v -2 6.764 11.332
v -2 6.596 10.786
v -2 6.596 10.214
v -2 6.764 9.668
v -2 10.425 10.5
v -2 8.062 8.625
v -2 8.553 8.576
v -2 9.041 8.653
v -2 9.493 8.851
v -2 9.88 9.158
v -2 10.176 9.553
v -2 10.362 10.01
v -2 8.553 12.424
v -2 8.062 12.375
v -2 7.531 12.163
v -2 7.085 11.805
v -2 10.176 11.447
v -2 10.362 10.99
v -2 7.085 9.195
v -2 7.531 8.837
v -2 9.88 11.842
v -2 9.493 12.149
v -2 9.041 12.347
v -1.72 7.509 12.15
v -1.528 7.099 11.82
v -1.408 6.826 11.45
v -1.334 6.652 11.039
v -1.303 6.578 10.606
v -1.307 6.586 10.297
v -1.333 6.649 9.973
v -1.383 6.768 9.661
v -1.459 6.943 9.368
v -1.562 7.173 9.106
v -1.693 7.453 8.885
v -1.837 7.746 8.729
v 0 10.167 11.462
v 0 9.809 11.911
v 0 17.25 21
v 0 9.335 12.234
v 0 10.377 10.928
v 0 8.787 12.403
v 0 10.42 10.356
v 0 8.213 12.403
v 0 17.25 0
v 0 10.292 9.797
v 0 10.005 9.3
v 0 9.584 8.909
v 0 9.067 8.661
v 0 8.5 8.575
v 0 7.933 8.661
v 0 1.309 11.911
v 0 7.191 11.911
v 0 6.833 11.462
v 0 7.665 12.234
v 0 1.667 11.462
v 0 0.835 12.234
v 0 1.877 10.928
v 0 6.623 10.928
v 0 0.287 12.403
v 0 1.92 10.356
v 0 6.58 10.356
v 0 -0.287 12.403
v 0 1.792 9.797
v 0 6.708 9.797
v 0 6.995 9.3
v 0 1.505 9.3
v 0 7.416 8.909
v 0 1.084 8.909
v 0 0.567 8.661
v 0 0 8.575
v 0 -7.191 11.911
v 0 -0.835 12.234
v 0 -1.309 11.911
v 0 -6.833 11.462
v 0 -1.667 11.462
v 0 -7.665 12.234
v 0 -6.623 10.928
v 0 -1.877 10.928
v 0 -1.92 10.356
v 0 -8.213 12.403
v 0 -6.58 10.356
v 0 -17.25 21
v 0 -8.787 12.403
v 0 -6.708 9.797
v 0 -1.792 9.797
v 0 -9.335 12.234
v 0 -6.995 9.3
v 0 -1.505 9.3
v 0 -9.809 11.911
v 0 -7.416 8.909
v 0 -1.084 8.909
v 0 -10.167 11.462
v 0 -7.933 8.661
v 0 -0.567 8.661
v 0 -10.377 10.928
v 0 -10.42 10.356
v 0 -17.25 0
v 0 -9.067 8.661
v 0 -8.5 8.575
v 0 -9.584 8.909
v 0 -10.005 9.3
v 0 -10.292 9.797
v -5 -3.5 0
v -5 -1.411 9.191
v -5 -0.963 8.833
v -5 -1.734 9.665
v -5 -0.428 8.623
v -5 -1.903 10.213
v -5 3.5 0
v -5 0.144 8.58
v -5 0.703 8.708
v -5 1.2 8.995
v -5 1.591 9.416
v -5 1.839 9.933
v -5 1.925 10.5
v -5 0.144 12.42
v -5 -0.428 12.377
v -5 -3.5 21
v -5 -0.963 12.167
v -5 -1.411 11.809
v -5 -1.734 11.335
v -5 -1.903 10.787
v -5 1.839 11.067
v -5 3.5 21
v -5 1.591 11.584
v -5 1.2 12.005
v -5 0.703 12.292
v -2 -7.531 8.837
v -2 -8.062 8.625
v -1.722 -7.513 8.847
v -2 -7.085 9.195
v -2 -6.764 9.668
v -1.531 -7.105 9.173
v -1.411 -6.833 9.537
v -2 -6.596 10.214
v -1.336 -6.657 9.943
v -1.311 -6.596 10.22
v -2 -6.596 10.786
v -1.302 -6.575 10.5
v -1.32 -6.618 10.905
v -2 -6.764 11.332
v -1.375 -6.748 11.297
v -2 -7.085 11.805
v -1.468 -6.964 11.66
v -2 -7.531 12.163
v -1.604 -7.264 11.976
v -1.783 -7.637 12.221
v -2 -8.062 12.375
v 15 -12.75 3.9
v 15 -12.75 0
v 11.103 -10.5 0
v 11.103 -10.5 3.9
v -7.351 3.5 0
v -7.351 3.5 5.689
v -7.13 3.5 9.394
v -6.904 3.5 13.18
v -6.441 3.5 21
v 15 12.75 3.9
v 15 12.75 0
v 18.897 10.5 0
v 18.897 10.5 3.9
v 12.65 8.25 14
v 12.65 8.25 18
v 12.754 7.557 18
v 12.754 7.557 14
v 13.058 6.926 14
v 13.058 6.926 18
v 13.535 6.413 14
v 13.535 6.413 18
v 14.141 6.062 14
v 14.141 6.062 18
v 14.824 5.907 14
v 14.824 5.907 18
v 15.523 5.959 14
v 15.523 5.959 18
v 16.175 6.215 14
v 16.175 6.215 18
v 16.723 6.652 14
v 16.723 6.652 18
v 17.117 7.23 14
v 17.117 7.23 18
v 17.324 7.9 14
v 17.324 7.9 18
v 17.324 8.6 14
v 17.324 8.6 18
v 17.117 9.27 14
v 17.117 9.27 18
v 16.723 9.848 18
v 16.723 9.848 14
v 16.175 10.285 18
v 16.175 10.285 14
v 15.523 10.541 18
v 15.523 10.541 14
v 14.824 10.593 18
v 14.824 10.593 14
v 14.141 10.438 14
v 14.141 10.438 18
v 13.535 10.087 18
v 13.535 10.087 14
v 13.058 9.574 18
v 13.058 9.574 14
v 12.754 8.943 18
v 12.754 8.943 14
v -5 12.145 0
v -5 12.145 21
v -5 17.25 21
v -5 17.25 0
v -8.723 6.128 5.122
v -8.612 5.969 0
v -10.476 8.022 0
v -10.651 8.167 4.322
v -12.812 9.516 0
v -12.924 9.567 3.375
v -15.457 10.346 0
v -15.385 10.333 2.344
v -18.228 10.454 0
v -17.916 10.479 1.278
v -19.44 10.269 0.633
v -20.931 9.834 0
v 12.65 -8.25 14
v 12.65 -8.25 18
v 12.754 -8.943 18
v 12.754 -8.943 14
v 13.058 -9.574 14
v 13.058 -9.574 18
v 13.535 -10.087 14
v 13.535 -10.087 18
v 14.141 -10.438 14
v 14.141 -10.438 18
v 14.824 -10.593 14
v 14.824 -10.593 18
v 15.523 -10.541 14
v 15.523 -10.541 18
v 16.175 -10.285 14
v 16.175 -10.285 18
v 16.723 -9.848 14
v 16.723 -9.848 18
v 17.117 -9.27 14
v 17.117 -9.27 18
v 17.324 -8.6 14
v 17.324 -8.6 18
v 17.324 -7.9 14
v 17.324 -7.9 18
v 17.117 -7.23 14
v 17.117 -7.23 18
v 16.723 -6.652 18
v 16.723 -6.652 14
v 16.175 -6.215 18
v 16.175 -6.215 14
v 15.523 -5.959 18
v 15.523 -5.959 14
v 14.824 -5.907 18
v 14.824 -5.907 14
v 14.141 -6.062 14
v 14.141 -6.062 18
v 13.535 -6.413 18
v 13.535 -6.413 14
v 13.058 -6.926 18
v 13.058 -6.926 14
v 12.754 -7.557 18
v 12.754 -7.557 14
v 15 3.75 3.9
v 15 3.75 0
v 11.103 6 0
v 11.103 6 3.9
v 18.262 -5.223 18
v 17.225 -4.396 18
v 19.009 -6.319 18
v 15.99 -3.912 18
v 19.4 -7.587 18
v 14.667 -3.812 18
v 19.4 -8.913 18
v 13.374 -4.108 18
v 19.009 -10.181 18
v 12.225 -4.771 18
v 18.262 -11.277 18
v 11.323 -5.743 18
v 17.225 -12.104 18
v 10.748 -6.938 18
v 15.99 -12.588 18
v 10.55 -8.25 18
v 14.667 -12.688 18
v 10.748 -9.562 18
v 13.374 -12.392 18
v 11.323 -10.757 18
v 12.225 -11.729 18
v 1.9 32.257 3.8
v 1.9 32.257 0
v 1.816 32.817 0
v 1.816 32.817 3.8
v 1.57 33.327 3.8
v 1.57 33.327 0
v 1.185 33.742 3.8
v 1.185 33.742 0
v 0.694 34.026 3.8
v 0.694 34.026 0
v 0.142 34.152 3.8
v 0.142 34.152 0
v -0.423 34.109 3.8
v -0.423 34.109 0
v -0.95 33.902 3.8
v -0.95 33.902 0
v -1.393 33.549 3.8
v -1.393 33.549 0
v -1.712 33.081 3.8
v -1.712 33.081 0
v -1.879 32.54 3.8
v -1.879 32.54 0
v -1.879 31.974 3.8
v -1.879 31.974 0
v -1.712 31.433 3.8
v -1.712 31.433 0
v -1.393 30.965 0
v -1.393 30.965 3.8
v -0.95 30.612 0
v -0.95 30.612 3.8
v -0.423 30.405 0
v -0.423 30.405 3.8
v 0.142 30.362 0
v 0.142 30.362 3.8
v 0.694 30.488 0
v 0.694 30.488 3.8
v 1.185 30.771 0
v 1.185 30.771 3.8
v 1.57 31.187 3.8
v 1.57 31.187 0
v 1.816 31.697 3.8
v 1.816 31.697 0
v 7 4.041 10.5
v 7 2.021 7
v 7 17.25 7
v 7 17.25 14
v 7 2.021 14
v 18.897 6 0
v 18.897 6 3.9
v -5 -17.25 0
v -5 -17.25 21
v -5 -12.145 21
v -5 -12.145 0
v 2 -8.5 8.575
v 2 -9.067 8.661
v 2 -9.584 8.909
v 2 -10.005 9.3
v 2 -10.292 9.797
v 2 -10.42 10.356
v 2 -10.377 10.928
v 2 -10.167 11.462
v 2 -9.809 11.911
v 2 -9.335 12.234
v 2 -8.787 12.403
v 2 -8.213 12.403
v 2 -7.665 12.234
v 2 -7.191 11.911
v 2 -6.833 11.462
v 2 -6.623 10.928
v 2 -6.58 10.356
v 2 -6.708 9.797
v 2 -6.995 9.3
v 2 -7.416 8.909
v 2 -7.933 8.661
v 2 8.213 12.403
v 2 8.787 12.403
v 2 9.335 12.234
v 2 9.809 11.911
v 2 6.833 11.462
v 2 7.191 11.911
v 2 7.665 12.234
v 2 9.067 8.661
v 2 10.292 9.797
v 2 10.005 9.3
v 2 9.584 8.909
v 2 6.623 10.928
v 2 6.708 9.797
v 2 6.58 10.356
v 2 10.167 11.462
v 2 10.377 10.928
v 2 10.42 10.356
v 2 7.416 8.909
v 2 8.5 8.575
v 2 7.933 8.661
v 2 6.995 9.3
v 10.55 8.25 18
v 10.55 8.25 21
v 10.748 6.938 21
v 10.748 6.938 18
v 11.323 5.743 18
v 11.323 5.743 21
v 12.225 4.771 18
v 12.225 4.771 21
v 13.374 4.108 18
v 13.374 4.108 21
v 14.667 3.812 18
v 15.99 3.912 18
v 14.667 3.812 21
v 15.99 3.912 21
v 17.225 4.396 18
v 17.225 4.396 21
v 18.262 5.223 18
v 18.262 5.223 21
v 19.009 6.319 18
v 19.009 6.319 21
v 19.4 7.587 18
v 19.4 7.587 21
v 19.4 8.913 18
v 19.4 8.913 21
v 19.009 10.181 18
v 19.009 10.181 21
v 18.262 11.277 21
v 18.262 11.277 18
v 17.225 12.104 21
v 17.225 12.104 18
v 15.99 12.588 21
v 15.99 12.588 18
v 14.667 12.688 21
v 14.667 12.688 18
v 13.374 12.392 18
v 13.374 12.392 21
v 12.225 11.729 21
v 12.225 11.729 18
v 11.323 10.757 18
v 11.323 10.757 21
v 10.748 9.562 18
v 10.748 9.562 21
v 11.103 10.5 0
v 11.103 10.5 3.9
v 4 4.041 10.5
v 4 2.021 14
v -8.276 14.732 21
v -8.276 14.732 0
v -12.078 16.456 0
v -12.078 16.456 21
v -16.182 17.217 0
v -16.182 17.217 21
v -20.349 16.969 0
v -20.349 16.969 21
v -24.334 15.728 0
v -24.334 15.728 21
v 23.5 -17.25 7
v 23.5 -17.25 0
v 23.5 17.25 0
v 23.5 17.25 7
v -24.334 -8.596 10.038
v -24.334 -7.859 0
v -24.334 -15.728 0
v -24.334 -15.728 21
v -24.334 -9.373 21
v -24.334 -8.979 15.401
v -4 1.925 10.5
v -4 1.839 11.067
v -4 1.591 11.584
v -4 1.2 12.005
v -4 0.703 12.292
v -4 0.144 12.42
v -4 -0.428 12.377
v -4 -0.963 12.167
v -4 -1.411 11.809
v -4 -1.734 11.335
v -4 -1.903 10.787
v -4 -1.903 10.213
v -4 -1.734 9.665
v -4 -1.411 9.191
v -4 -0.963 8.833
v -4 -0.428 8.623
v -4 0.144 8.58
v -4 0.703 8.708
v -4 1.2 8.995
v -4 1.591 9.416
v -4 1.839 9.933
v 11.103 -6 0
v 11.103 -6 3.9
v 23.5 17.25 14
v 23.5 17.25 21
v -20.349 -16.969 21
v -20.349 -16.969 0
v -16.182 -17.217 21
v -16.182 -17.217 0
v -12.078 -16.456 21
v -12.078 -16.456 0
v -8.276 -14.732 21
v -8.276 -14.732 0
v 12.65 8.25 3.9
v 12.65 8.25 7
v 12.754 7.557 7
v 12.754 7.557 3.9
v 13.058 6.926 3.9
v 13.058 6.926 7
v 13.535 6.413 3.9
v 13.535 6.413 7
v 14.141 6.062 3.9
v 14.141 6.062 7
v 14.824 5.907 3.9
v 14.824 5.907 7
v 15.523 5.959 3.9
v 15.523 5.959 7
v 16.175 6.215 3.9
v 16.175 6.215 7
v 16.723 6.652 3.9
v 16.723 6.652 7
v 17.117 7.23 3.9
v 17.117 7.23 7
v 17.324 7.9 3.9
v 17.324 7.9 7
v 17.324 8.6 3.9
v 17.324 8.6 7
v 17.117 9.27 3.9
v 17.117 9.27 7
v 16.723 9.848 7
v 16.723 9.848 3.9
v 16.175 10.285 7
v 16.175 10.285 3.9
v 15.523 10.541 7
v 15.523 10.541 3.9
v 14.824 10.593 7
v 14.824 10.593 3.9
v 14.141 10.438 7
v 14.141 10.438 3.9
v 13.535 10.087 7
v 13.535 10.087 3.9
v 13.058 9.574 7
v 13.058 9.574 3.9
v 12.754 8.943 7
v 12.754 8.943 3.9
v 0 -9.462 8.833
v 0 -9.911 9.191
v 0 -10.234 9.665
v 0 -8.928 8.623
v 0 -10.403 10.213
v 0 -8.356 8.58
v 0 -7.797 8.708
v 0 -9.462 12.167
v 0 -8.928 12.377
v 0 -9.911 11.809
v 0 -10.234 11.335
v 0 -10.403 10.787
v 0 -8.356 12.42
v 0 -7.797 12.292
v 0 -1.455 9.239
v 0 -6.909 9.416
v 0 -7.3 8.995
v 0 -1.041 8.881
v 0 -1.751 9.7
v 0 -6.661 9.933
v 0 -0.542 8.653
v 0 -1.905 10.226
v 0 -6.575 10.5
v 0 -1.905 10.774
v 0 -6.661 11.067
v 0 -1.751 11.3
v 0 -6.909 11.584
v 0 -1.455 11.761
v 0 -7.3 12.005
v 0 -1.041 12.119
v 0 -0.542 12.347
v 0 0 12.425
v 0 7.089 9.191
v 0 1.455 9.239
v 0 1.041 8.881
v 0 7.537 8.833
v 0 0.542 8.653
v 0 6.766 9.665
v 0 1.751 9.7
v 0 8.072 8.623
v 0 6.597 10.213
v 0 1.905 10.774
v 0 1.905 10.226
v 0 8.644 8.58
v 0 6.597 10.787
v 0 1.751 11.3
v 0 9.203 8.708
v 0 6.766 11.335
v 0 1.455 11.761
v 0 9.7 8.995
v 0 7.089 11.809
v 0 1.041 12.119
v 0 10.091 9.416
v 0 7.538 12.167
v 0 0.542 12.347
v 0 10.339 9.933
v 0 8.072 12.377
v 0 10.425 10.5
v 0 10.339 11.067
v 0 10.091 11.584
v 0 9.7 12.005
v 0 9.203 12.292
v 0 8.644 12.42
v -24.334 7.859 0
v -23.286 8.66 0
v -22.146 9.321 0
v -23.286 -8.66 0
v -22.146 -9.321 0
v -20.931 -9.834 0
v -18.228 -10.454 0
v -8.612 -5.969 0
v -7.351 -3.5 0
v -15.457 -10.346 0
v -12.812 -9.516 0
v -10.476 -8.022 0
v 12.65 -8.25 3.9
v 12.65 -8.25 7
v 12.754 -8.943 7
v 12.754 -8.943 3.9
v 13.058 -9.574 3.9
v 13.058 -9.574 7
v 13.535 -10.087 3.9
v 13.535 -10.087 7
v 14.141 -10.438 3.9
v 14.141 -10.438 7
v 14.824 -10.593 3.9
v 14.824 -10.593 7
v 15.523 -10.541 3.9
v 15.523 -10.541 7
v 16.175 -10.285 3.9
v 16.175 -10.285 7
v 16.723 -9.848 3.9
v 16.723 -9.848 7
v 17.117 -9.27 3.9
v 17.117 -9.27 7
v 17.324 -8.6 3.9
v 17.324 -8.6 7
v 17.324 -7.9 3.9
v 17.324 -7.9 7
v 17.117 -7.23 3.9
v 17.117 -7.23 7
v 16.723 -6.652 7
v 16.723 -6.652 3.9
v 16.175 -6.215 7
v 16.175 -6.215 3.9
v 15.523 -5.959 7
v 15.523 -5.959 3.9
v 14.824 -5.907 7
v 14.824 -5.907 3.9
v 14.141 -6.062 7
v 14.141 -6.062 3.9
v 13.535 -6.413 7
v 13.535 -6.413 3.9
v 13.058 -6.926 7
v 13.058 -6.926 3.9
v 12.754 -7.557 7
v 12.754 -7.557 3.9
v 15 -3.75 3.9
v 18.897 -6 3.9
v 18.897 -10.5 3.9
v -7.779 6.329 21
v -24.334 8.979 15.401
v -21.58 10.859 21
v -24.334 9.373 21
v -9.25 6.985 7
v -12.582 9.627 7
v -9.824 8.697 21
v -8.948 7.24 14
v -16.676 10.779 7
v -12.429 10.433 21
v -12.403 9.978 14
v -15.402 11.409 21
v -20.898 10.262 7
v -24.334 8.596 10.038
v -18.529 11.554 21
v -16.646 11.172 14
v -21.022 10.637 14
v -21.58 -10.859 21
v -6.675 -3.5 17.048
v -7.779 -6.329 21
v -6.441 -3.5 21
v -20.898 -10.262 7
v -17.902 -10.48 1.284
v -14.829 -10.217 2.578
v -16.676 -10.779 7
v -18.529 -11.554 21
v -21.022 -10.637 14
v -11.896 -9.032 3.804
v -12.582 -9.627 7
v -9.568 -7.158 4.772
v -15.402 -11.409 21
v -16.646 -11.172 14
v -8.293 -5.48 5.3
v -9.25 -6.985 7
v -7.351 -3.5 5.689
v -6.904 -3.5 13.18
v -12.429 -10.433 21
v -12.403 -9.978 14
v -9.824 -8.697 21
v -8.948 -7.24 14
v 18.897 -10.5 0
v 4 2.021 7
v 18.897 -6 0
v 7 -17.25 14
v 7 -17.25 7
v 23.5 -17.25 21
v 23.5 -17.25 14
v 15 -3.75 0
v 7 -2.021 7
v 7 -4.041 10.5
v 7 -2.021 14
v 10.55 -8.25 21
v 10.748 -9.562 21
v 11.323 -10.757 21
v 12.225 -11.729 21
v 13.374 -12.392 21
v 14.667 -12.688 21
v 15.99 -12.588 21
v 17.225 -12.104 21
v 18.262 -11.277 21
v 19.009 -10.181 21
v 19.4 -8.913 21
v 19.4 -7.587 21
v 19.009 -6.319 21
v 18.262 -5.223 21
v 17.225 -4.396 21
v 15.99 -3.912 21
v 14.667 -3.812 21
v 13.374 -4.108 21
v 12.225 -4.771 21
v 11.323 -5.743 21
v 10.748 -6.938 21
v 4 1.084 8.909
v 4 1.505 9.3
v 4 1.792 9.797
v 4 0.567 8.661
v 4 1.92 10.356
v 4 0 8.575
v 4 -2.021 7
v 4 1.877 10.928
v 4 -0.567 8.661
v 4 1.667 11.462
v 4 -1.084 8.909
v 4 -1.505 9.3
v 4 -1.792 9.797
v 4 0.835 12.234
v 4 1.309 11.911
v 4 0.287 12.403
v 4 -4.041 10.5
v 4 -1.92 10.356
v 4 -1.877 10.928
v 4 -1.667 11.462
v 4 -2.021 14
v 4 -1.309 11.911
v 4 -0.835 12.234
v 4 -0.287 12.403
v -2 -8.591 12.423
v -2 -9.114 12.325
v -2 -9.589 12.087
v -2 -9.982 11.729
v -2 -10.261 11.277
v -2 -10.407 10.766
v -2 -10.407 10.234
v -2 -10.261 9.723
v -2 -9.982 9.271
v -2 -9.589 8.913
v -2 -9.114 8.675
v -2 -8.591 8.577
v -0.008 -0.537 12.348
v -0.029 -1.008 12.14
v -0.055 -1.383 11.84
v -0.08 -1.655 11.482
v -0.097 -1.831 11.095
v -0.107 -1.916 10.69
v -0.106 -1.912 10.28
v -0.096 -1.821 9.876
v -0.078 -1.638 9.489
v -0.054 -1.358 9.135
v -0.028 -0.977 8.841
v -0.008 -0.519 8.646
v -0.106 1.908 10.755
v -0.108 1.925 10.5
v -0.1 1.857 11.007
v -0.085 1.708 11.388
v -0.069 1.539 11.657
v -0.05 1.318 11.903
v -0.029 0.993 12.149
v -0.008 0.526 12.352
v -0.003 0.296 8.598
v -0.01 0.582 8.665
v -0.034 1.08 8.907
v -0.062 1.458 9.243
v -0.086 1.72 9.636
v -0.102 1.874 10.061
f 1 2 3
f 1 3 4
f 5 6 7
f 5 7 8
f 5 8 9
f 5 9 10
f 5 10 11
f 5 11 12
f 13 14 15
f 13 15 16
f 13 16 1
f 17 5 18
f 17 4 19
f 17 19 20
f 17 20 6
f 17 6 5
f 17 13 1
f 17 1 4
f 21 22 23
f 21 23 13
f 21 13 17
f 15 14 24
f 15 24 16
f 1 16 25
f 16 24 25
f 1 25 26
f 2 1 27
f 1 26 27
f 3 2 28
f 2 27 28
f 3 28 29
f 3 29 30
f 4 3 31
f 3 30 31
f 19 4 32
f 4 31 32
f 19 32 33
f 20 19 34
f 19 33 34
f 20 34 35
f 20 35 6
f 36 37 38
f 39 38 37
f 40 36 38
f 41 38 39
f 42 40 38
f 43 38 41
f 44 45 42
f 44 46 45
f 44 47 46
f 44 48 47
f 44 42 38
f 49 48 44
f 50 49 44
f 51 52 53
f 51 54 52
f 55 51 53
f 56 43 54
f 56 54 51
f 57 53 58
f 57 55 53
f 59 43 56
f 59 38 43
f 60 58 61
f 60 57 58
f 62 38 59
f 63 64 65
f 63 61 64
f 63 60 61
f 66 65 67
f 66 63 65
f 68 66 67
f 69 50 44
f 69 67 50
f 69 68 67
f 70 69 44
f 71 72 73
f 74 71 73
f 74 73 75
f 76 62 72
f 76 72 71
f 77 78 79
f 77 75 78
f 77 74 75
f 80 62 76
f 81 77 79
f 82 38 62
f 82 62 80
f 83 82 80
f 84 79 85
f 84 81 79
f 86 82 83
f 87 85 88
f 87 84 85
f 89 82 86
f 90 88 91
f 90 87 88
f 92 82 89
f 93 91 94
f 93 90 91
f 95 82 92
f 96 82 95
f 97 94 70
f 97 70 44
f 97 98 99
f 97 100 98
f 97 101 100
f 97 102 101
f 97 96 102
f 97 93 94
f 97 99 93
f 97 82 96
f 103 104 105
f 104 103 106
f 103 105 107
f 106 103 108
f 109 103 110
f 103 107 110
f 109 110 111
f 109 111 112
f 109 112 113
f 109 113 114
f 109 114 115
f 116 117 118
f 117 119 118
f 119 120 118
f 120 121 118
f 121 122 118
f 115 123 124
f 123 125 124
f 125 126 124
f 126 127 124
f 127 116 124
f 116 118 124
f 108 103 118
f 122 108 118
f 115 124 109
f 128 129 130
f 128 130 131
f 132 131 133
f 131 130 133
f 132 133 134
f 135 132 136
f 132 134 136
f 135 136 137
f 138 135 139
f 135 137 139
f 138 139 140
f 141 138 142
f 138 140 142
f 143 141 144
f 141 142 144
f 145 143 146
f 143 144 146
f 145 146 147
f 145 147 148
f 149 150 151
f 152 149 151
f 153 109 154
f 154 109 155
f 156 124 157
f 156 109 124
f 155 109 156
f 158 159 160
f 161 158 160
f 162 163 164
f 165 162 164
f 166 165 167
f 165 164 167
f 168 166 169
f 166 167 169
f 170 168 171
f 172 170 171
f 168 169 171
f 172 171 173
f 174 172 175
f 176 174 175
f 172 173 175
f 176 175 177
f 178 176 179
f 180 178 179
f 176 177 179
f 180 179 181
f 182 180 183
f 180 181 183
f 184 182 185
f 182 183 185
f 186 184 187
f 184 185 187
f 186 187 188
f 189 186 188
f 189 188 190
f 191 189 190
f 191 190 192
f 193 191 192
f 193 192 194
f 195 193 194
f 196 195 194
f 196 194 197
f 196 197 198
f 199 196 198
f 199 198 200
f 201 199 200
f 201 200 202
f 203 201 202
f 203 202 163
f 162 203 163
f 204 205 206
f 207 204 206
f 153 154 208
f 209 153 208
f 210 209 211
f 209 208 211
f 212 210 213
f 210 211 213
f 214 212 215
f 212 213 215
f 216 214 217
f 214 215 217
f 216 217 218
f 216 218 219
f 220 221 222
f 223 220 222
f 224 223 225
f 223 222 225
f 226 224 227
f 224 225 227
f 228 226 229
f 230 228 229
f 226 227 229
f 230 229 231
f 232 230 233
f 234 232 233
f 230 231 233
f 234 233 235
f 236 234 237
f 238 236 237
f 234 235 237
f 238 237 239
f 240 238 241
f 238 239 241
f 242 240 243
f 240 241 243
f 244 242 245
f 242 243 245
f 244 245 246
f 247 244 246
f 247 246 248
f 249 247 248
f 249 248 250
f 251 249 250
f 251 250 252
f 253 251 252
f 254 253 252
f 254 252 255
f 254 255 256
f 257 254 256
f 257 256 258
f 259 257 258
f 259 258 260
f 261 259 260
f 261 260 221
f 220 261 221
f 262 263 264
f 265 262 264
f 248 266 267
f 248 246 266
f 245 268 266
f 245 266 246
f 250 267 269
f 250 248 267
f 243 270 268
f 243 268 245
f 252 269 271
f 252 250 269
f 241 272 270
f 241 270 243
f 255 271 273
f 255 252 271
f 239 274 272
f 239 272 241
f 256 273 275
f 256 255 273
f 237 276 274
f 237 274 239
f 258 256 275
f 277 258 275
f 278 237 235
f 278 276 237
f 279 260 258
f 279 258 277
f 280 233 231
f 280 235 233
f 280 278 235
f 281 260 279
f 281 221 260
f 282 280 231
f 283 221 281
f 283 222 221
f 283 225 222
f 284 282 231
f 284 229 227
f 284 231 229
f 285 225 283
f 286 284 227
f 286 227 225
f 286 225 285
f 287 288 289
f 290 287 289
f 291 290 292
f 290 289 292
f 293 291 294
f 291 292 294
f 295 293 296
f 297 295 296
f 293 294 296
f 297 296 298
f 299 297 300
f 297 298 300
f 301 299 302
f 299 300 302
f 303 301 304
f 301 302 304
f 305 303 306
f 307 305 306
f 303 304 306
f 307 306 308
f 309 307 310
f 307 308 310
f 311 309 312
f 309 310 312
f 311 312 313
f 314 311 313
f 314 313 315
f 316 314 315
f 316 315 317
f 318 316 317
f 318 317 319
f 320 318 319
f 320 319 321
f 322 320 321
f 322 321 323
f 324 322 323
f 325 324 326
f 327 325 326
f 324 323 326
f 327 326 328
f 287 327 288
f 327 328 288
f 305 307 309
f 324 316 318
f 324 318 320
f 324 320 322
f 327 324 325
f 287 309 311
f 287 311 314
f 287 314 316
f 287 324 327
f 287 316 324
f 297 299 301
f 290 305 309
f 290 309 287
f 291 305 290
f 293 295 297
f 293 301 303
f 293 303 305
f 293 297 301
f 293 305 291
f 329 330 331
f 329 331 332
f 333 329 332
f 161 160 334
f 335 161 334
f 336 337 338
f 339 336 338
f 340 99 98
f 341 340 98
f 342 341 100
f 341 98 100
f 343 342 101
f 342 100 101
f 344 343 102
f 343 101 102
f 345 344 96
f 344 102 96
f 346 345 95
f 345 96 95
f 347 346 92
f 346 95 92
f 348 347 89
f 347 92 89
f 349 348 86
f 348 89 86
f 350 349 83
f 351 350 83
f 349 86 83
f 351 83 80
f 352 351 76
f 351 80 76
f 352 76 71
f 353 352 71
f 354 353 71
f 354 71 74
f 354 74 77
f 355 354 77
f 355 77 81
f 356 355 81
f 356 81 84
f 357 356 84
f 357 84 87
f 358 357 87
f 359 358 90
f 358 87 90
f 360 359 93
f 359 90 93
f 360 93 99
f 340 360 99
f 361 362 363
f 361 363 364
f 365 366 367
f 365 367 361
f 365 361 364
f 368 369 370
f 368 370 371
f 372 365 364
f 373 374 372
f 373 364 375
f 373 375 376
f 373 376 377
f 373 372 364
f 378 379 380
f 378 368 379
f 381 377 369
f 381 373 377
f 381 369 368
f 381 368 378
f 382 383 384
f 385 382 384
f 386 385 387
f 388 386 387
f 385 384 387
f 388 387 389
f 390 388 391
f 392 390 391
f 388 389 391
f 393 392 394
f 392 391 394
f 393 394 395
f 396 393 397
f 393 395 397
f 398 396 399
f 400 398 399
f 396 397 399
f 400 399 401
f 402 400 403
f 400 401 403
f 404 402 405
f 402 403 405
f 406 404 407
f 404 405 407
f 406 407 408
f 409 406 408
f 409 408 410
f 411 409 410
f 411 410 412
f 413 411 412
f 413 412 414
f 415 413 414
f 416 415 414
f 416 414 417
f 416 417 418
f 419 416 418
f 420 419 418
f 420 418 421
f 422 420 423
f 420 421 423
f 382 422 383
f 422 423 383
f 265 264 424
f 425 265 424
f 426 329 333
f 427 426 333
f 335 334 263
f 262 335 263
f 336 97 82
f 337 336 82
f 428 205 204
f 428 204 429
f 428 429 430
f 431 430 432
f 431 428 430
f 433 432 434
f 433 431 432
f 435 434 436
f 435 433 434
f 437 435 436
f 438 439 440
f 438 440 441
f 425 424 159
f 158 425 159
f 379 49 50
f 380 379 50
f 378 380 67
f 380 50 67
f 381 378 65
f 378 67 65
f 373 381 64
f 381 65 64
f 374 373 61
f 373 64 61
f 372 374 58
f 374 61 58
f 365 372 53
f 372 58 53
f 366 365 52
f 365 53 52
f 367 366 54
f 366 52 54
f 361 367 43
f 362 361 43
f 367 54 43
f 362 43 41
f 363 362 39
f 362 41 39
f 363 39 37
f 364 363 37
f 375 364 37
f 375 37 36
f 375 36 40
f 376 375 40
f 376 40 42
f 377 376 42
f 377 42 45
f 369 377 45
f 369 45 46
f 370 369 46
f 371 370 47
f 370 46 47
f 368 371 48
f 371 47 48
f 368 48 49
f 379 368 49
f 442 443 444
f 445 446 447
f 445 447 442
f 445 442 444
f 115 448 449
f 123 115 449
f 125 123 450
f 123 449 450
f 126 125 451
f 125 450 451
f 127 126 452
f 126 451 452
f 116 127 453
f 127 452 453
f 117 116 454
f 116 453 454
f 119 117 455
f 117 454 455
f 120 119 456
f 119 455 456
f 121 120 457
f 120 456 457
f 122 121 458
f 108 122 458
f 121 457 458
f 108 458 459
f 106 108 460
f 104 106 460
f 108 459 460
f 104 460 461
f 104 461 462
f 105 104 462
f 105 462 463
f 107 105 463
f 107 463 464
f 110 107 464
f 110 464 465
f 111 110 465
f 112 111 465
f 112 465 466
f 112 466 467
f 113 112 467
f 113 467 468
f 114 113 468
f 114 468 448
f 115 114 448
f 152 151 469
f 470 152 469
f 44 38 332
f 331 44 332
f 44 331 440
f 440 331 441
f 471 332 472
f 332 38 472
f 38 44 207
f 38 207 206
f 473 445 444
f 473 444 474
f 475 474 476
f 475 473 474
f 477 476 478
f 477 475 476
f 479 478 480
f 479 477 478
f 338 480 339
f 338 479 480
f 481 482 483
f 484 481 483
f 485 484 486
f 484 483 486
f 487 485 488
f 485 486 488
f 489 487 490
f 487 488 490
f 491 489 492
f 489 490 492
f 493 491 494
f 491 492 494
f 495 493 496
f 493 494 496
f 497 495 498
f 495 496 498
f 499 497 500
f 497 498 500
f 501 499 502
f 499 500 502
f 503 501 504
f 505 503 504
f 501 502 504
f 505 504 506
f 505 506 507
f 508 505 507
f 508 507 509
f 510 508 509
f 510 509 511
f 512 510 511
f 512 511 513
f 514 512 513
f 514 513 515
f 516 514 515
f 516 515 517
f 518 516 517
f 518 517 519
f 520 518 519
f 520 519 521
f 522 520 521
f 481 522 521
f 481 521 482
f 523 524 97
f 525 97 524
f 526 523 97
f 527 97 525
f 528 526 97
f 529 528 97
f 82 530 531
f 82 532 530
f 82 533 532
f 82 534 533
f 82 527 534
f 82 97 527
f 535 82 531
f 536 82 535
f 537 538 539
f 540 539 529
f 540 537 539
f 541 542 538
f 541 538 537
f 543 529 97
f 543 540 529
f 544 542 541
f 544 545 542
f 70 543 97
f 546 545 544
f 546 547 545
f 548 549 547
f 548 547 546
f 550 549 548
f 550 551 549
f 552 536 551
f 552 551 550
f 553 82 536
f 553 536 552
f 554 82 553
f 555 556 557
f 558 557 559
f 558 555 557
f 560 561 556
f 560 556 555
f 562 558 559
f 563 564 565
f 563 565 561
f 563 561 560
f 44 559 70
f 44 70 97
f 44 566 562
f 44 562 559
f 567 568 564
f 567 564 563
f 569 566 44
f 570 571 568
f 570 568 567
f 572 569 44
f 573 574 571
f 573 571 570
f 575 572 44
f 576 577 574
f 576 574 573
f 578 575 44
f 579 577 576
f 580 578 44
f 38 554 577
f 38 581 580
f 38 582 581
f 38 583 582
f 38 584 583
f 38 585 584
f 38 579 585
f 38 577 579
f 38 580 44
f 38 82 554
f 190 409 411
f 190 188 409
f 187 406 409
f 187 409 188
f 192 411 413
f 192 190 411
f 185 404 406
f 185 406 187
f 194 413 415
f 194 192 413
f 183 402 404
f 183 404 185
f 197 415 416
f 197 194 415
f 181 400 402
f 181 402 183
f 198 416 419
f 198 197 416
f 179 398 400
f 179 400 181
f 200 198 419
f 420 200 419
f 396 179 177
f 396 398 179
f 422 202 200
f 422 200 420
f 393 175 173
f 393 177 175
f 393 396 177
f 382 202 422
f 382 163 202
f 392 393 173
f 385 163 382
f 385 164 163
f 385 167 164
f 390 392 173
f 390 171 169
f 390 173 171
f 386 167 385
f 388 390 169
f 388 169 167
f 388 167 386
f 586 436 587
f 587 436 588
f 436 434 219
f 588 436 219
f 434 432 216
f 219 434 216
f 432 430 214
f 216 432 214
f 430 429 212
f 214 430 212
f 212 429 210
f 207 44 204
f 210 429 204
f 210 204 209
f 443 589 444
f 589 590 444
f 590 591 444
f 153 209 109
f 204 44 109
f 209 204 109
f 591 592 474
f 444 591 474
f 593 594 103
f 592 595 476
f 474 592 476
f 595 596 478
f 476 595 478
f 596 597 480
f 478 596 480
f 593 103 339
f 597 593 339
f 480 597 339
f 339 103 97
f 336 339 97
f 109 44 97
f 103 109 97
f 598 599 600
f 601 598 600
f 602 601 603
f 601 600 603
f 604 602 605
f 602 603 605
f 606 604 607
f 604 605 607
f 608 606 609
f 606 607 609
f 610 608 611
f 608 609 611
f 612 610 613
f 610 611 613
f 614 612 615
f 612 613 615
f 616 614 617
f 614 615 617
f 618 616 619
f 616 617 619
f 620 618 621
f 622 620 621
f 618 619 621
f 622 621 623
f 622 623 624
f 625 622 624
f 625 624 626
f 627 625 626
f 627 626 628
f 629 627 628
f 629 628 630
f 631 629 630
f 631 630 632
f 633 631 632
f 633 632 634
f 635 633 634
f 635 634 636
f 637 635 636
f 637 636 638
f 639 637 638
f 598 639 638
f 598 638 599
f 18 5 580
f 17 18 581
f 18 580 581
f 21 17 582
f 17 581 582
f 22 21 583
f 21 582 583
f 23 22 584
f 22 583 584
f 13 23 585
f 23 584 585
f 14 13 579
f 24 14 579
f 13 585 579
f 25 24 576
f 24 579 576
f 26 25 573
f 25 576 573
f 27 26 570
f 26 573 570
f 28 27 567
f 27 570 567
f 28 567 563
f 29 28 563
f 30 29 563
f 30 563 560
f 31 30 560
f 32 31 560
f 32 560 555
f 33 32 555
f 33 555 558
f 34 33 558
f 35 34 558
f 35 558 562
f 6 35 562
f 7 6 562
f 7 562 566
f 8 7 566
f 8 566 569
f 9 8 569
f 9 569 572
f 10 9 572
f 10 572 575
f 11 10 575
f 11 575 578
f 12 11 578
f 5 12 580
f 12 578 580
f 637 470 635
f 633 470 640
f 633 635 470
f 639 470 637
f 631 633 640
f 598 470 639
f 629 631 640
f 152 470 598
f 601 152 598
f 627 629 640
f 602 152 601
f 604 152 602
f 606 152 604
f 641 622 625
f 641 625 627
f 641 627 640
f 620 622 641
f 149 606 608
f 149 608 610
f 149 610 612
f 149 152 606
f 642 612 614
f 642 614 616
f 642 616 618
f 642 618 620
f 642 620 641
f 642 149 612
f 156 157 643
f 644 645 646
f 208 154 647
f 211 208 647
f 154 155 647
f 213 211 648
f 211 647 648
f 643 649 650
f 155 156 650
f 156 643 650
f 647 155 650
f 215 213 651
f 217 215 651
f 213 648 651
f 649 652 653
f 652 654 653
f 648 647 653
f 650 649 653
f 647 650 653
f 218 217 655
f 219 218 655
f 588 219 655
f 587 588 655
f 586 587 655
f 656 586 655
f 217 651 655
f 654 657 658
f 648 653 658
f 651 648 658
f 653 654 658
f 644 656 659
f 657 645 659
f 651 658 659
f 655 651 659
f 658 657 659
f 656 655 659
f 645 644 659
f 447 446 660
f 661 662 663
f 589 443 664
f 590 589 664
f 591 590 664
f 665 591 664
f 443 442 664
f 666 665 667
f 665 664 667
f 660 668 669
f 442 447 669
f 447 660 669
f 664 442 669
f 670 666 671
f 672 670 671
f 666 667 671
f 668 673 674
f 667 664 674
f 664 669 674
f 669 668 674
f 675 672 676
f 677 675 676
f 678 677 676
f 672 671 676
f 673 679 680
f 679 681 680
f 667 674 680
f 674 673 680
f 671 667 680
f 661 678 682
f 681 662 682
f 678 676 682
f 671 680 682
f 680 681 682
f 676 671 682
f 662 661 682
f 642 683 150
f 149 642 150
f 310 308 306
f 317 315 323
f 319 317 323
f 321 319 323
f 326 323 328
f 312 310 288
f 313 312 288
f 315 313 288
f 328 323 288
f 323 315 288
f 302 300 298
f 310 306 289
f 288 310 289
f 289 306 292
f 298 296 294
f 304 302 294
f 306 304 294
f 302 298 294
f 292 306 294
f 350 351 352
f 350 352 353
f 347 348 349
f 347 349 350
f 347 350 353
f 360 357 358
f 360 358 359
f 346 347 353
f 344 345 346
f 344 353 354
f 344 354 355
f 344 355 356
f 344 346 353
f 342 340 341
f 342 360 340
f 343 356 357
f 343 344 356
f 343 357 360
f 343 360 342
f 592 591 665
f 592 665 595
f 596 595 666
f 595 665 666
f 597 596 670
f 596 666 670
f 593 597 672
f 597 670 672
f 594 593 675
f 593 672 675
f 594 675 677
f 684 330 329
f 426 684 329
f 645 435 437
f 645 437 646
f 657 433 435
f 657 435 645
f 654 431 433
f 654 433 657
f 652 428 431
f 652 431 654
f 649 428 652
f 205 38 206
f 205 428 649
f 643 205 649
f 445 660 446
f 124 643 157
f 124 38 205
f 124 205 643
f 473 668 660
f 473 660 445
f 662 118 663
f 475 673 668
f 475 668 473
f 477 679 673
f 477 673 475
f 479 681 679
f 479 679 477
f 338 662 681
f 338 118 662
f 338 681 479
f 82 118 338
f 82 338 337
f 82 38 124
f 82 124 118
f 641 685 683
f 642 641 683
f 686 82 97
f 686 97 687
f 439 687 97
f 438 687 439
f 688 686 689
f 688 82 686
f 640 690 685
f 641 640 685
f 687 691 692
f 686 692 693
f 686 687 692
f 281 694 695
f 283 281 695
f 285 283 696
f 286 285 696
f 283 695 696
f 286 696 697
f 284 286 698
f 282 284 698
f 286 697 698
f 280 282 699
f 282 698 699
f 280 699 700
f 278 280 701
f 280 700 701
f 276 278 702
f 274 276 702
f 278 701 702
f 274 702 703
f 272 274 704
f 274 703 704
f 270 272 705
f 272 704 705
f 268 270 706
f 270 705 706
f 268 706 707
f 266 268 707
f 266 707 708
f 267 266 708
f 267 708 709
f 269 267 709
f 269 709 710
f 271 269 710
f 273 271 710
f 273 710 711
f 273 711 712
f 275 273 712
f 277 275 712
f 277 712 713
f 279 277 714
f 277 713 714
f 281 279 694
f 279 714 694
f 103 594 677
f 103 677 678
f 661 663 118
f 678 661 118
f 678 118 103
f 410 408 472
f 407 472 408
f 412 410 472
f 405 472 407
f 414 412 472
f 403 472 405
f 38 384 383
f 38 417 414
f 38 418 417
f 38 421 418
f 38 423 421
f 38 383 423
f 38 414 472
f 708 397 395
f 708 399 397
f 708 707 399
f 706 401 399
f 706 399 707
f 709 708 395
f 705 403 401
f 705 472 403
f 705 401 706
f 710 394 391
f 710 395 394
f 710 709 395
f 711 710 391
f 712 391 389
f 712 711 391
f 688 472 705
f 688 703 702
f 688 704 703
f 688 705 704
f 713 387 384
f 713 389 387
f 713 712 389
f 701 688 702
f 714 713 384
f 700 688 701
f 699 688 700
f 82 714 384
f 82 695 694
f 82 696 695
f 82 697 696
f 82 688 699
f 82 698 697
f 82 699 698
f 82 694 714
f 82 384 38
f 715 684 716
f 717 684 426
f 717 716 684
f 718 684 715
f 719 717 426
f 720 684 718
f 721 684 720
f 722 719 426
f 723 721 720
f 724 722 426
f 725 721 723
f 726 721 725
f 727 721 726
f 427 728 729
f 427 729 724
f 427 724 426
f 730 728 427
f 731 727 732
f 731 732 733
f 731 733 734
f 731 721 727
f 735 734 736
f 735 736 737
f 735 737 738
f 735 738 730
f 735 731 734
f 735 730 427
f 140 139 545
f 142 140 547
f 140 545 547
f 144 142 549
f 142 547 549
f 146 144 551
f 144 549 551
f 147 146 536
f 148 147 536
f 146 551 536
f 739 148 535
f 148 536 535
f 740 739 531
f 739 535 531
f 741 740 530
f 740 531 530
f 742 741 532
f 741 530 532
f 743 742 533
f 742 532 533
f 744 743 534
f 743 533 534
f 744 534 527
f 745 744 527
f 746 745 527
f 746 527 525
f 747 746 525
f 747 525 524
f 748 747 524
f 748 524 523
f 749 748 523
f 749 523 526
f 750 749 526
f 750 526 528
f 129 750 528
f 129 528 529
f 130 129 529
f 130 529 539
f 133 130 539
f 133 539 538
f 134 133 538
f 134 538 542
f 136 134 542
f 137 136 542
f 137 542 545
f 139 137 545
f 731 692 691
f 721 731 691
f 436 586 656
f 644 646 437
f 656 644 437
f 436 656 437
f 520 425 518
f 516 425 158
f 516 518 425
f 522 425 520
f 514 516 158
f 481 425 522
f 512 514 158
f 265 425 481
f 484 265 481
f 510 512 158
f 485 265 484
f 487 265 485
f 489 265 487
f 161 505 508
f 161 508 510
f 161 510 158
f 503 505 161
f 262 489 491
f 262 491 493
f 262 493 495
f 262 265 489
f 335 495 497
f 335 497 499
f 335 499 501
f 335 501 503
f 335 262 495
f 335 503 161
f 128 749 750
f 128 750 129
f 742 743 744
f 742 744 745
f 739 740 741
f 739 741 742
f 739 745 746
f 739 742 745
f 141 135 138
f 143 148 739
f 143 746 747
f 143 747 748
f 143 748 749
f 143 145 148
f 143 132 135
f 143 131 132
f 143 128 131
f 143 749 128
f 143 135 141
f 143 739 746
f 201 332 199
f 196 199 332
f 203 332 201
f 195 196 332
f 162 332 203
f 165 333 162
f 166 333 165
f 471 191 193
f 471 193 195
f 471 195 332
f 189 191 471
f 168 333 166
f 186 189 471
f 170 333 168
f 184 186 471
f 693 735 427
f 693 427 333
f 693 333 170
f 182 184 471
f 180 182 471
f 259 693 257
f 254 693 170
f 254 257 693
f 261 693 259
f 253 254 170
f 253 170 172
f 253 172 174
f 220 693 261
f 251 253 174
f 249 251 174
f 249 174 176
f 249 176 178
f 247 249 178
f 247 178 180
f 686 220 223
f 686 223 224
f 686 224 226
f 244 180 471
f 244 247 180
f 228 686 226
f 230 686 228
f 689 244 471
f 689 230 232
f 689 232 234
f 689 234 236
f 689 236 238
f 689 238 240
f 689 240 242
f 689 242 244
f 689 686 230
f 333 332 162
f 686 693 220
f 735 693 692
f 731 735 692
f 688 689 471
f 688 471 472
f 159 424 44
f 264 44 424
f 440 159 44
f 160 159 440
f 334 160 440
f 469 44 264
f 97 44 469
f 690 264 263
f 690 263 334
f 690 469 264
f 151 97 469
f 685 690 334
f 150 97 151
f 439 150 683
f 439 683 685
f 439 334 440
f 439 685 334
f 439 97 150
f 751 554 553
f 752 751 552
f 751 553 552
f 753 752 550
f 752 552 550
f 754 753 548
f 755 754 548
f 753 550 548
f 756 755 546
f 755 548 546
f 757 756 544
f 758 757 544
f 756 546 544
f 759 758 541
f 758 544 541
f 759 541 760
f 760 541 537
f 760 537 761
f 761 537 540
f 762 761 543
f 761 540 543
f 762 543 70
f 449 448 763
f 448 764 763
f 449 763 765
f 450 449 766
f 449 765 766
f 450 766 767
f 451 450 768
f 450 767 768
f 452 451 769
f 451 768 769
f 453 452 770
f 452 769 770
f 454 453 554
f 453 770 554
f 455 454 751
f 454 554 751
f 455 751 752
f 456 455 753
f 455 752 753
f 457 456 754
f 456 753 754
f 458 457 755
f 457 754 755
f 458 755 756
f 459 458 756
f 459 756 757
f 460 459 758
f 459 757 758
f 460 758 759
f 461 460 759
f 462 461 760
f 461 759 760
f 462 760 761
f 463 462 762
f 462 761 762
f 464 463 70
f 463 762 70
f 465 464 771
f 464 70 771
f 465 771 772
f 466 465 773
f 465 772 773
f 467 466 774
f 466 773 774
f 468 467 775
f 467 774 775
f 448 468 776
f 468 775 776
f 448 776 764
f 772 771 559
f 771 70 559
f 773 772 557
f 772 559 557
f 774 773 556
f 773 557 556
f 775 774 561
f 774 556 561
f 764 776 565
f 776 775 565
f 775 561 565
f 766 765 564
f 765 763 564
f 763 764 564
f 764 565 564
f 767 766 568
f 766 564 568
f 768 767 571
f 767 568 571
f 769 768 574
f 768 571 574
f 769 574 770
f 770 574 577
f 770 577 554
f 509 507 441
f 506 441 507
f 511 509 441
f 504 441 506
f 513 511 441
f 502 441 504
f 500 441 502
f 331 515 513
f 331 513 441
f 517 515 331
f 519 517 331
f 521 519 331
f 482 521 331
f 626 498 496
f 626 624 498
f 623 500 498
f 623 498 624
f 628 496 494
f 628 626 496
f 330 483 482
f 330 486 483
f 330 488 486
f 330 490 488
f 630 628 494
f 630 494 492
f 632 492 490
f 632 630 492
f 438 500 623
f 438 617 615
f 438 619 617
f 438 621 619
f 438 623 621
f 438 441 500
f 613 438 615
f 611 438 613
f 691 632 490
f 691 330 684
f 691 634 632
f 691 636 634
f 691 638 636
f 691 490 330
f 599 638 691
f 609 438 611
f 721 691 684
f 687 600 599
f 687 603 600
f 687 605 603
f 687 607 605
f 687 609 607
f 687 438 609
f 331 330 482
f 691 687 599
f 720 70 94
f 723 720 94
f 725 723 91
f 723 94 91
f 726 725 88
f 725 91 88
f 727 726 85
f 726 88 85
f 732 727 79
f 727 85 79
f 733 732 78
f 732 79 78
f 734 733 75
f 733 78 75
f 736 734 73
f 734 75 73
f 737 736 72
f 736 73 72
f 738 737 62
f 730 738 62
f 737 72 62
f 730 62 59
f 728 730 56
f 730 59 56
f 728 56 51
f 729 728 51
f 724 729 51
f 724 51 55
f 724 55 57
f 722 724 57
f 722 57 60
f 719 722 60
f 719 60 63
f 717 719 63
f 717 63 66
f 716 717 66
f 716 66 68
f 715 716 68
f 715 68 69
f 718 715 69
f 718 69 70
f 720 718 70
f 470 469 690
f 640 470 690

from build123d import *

# Parameters (mm, degrees)
PAD_DEPTH       = 17.25
SKETCH001_R     = 2.35
POCKET_DEPTH    = 21.001
POCKET001_DEPTH = 3.9
SKETCH003_R     = 4.45
POCKET002_DEPTH = 3
SKETCH004_R     = 1.925
POCKET003_DEPTH = 23.501
POCKET004_DEPTH = 3
SKETCH006_R     = 1.925
POCKET005_DEPTH = 2
SKETCH012_R     = 1.9
PAD003_DEPTH    = 3.8
SKETCH007_W     = 34.5
SKETCH007_H     = 21
SKETCH007_R     = 1.925
PAD001_DEPTH    = 5
SKETCH008_R     = 1.925
POCKET006_DEPTH = 2
PAD002_DEPTH    = 21
SKETCH010_R     = 1.925
POCKET007_DEPTH = 2
SKETCH011_R     = 1.925
POCKET008_DEPTH = 24.335471


with BuildPart() as soporte_ducha_estanteria:
    # Sketch → Pad (new body, symmetric)
    with BuildSketch(Plane.XZ):
        Polygon((0, 0), (23.5, 0), (23.5, 7), (7, 7), (7, 14), (23.5, 14), (23.5, 21), (0, 21), align=None)
    extrude(amount=PAD_DEPTH, both=True)

    # Sketch001 → Pocket (cut, through all)
    with BuildSketch(Plane(origin=(0, 0, 21), x_dir=(-1, 0, 0), z_dir=(0, 0, 1))):
        with Locations((-15, 8.25)):
            Circle(SKETCH001_R)
        with Locations((-15, -8.25)):
            Circle(SKETCH001_R)
    extrude(amount=-POCKET_DEPTH, mode=Mode.SUBTRACT)

    # Sketch002 → Pocket001 (cut)
    with BuildSketch(Plane(origin=(0, 0, 0), x_dir=(1, 0, 0), z_dir=(0, 0, -1))):
        Polygon((15, 12.75), (11.102886, 10.5), (11.102886, 6), (15, 3.75), (18.897114, 6), (18.897114, 10.5), align=None)
        Polygon((15, -3.75), (11.102886, -6), (11.102886, -10.5), (15, -12.75), (18.897114, -10.5), (18.897114, -6), align=None)
    extrude(amount=-POCKET001_DEPTH, mode=Mode.SUBTRACT)

    # Sketch003 → Pocket002 (cut)
    with BuildSketch(Plane(origin=(0, 0, 21), x_dir=(-1, 0, 0), z_dir=(0, 0, 1))):
        with Locations((-15, 8.25)):
            Circle(SKETCH003_R)
        with Locations((-15, -8.25)):
            Circle(SKETCH003_R)
    extrude(amount=-POCKET002_DEPTH, mode=Mode.SUBTRACT)

    # Sketch004 → Pocket003 (cut, through all)
    with BuildSketch(Plane(origin=(0, 0, 0), x_dir=(0, 0, -1), z_dir=(-1, 0, 0))):
        with Locations((-10.5, 0)):
            Circle(SKETCH004_R)
    extrude(amount=-POCKET003_DEPTH, mode=Mode.SUBTRACT)

    # Sketch005 → Pocket004 (cut)
    with BuildSketch(Plane(origin=(7, 0, 0), x_dir=(0, 0, 1), z_dir=(1, 0, 0))):
        Polygon((7, 2.020726), (7, -2.020726), (10.5, -4.041452), (14, -2.020726), (14, 2.020726), (10.5, 4.041452), align=None)
    extrude(amount=-POCKET004_DEPTH, mode=Mode.SUBTRACT)

    # Sketch006 → Pocket005 (cut)
    with BuildSketch(Plane(origin=(0, 0, 0), x_dir=(0, 0, -1), z_dir=(-1, 0, 0))):
        with Locations((-10.5, -8.5)):
            Circle(SKETCH006_R)
        with Locations((-10.5, 8.5)):
            Circle(SKETCH006_R)
    extrude(amount=-POCKET005_DEPTH, mode=Mode.SUBTRACT)


with BuildPart() as pernos_union:
    # Sketch012 → Pad003 (new body)
    with BuildSketch(Plane(origin=(0, -10, 0), x_dir=(1, 0, 0), z_dir=(0, 0, 1))):
        with Locations((0, 42.256969)):
            Circle(SKETCH012_R)
    extrude(amount=PAD003_DEPTH)


with BuildPart() as cono:
    # Cone → Cone (revolve)
    with BuildSketch(Plane(origin=(-17.5, 0, 0), x_dir=(1, 0, 0), z_dir=(0, -1, 0))):
        Polygon((0, 0), (10.415, 0), (11.6, 21), (0, 21), align=None)
    revolve(axis=Axis((-17.5, 0, 0), (0, 0, 1)))


with BuildPart() as soporte_ducha_telefono_cono:
    # Sketch007 → Pad001 (new body)
    with BuildSketch(Plane.YZ):
        with Locations((0, 10.5)):
            Rectangle(SKETCH007_W, SKETCH007_H)
        with Locations((0, 10.5)):
            Circle(SKETCH007_R, mode=Mode.SUBTRACT)
    extrude(amount=-PAD001_DEPTH)

    # Sketch008 → Pocket006 (cut)
    with BuildSketch(Plane.YZ):
        with Locations((-8.5, 10.5)):
            Circle(SKETCH008_R)
        with Locations((8.5, 10.5)):
            Circle(SKETCH008_R)
    extrude(amount=-POCKET006_DEPTH, mode=Mode.SUBTRACT)

    # Sketch009 → Pad002 (new body)
    with BuildSketch(Plane(origin=(0, 0, 21), x_dir=(0, -1, 0), z_dir=(0, 0, 1))):
        with BuildLine():
            ThreePointArc((15.728159, -24.334314), (-8.6e-05, 0), (-15.728089, -24.334471))
            Line((-7.75, -24.334314), (-15.728089, -24.334471))
            ThreePointArc((-3.5, -7.350505), (-10.185925, -14.701091), (-7.75, -24.334314))
            Line((-3.5, -4), (-3.5, -7.350505))
            Line((3.5, -4), (-3.5, -4))
            Line((3.5, -7.350505), (3.5, -4))
            ThreePointArc((7.75, -24.334314), (10.185925, -14.701091), (3.5, -7.350505))
            Line((7.75, -24.334314), (15.728159, -24.334314))
        make_face()
    extrude(amount=-PAD002_DEPTH)

    # Sketch010 → Pocket007 (cut)
    with BuildSketch(Plane.YZ):
        with Locations((-8.5, 10.5)):
            Circle(SKETCH010_R)
        with Locations((8.5, 10.5)):
            Circle(SKETCH010_R)
    extrude(amount=-POCKET007_DEPTH, mode=Mode.SUBTRACT)

    # Sketch011 → Pocket008 (cut, through all)
    with BuildSketch(Plane.YZ):
        with Locations((0, 10.5)):
            Circle(SKETCH011_R)
    extrude(amount=-POCKET008_DEPTH, mode=Mode.SUBTRACT)

    # Cut: cut Cono
    add(cono.part, mode=Mode.SUBTRACT)


solid = Compound([soporte_ducha_estanteria.part, pernos_union.part, soporte_ducha_telefono_cono.part])
